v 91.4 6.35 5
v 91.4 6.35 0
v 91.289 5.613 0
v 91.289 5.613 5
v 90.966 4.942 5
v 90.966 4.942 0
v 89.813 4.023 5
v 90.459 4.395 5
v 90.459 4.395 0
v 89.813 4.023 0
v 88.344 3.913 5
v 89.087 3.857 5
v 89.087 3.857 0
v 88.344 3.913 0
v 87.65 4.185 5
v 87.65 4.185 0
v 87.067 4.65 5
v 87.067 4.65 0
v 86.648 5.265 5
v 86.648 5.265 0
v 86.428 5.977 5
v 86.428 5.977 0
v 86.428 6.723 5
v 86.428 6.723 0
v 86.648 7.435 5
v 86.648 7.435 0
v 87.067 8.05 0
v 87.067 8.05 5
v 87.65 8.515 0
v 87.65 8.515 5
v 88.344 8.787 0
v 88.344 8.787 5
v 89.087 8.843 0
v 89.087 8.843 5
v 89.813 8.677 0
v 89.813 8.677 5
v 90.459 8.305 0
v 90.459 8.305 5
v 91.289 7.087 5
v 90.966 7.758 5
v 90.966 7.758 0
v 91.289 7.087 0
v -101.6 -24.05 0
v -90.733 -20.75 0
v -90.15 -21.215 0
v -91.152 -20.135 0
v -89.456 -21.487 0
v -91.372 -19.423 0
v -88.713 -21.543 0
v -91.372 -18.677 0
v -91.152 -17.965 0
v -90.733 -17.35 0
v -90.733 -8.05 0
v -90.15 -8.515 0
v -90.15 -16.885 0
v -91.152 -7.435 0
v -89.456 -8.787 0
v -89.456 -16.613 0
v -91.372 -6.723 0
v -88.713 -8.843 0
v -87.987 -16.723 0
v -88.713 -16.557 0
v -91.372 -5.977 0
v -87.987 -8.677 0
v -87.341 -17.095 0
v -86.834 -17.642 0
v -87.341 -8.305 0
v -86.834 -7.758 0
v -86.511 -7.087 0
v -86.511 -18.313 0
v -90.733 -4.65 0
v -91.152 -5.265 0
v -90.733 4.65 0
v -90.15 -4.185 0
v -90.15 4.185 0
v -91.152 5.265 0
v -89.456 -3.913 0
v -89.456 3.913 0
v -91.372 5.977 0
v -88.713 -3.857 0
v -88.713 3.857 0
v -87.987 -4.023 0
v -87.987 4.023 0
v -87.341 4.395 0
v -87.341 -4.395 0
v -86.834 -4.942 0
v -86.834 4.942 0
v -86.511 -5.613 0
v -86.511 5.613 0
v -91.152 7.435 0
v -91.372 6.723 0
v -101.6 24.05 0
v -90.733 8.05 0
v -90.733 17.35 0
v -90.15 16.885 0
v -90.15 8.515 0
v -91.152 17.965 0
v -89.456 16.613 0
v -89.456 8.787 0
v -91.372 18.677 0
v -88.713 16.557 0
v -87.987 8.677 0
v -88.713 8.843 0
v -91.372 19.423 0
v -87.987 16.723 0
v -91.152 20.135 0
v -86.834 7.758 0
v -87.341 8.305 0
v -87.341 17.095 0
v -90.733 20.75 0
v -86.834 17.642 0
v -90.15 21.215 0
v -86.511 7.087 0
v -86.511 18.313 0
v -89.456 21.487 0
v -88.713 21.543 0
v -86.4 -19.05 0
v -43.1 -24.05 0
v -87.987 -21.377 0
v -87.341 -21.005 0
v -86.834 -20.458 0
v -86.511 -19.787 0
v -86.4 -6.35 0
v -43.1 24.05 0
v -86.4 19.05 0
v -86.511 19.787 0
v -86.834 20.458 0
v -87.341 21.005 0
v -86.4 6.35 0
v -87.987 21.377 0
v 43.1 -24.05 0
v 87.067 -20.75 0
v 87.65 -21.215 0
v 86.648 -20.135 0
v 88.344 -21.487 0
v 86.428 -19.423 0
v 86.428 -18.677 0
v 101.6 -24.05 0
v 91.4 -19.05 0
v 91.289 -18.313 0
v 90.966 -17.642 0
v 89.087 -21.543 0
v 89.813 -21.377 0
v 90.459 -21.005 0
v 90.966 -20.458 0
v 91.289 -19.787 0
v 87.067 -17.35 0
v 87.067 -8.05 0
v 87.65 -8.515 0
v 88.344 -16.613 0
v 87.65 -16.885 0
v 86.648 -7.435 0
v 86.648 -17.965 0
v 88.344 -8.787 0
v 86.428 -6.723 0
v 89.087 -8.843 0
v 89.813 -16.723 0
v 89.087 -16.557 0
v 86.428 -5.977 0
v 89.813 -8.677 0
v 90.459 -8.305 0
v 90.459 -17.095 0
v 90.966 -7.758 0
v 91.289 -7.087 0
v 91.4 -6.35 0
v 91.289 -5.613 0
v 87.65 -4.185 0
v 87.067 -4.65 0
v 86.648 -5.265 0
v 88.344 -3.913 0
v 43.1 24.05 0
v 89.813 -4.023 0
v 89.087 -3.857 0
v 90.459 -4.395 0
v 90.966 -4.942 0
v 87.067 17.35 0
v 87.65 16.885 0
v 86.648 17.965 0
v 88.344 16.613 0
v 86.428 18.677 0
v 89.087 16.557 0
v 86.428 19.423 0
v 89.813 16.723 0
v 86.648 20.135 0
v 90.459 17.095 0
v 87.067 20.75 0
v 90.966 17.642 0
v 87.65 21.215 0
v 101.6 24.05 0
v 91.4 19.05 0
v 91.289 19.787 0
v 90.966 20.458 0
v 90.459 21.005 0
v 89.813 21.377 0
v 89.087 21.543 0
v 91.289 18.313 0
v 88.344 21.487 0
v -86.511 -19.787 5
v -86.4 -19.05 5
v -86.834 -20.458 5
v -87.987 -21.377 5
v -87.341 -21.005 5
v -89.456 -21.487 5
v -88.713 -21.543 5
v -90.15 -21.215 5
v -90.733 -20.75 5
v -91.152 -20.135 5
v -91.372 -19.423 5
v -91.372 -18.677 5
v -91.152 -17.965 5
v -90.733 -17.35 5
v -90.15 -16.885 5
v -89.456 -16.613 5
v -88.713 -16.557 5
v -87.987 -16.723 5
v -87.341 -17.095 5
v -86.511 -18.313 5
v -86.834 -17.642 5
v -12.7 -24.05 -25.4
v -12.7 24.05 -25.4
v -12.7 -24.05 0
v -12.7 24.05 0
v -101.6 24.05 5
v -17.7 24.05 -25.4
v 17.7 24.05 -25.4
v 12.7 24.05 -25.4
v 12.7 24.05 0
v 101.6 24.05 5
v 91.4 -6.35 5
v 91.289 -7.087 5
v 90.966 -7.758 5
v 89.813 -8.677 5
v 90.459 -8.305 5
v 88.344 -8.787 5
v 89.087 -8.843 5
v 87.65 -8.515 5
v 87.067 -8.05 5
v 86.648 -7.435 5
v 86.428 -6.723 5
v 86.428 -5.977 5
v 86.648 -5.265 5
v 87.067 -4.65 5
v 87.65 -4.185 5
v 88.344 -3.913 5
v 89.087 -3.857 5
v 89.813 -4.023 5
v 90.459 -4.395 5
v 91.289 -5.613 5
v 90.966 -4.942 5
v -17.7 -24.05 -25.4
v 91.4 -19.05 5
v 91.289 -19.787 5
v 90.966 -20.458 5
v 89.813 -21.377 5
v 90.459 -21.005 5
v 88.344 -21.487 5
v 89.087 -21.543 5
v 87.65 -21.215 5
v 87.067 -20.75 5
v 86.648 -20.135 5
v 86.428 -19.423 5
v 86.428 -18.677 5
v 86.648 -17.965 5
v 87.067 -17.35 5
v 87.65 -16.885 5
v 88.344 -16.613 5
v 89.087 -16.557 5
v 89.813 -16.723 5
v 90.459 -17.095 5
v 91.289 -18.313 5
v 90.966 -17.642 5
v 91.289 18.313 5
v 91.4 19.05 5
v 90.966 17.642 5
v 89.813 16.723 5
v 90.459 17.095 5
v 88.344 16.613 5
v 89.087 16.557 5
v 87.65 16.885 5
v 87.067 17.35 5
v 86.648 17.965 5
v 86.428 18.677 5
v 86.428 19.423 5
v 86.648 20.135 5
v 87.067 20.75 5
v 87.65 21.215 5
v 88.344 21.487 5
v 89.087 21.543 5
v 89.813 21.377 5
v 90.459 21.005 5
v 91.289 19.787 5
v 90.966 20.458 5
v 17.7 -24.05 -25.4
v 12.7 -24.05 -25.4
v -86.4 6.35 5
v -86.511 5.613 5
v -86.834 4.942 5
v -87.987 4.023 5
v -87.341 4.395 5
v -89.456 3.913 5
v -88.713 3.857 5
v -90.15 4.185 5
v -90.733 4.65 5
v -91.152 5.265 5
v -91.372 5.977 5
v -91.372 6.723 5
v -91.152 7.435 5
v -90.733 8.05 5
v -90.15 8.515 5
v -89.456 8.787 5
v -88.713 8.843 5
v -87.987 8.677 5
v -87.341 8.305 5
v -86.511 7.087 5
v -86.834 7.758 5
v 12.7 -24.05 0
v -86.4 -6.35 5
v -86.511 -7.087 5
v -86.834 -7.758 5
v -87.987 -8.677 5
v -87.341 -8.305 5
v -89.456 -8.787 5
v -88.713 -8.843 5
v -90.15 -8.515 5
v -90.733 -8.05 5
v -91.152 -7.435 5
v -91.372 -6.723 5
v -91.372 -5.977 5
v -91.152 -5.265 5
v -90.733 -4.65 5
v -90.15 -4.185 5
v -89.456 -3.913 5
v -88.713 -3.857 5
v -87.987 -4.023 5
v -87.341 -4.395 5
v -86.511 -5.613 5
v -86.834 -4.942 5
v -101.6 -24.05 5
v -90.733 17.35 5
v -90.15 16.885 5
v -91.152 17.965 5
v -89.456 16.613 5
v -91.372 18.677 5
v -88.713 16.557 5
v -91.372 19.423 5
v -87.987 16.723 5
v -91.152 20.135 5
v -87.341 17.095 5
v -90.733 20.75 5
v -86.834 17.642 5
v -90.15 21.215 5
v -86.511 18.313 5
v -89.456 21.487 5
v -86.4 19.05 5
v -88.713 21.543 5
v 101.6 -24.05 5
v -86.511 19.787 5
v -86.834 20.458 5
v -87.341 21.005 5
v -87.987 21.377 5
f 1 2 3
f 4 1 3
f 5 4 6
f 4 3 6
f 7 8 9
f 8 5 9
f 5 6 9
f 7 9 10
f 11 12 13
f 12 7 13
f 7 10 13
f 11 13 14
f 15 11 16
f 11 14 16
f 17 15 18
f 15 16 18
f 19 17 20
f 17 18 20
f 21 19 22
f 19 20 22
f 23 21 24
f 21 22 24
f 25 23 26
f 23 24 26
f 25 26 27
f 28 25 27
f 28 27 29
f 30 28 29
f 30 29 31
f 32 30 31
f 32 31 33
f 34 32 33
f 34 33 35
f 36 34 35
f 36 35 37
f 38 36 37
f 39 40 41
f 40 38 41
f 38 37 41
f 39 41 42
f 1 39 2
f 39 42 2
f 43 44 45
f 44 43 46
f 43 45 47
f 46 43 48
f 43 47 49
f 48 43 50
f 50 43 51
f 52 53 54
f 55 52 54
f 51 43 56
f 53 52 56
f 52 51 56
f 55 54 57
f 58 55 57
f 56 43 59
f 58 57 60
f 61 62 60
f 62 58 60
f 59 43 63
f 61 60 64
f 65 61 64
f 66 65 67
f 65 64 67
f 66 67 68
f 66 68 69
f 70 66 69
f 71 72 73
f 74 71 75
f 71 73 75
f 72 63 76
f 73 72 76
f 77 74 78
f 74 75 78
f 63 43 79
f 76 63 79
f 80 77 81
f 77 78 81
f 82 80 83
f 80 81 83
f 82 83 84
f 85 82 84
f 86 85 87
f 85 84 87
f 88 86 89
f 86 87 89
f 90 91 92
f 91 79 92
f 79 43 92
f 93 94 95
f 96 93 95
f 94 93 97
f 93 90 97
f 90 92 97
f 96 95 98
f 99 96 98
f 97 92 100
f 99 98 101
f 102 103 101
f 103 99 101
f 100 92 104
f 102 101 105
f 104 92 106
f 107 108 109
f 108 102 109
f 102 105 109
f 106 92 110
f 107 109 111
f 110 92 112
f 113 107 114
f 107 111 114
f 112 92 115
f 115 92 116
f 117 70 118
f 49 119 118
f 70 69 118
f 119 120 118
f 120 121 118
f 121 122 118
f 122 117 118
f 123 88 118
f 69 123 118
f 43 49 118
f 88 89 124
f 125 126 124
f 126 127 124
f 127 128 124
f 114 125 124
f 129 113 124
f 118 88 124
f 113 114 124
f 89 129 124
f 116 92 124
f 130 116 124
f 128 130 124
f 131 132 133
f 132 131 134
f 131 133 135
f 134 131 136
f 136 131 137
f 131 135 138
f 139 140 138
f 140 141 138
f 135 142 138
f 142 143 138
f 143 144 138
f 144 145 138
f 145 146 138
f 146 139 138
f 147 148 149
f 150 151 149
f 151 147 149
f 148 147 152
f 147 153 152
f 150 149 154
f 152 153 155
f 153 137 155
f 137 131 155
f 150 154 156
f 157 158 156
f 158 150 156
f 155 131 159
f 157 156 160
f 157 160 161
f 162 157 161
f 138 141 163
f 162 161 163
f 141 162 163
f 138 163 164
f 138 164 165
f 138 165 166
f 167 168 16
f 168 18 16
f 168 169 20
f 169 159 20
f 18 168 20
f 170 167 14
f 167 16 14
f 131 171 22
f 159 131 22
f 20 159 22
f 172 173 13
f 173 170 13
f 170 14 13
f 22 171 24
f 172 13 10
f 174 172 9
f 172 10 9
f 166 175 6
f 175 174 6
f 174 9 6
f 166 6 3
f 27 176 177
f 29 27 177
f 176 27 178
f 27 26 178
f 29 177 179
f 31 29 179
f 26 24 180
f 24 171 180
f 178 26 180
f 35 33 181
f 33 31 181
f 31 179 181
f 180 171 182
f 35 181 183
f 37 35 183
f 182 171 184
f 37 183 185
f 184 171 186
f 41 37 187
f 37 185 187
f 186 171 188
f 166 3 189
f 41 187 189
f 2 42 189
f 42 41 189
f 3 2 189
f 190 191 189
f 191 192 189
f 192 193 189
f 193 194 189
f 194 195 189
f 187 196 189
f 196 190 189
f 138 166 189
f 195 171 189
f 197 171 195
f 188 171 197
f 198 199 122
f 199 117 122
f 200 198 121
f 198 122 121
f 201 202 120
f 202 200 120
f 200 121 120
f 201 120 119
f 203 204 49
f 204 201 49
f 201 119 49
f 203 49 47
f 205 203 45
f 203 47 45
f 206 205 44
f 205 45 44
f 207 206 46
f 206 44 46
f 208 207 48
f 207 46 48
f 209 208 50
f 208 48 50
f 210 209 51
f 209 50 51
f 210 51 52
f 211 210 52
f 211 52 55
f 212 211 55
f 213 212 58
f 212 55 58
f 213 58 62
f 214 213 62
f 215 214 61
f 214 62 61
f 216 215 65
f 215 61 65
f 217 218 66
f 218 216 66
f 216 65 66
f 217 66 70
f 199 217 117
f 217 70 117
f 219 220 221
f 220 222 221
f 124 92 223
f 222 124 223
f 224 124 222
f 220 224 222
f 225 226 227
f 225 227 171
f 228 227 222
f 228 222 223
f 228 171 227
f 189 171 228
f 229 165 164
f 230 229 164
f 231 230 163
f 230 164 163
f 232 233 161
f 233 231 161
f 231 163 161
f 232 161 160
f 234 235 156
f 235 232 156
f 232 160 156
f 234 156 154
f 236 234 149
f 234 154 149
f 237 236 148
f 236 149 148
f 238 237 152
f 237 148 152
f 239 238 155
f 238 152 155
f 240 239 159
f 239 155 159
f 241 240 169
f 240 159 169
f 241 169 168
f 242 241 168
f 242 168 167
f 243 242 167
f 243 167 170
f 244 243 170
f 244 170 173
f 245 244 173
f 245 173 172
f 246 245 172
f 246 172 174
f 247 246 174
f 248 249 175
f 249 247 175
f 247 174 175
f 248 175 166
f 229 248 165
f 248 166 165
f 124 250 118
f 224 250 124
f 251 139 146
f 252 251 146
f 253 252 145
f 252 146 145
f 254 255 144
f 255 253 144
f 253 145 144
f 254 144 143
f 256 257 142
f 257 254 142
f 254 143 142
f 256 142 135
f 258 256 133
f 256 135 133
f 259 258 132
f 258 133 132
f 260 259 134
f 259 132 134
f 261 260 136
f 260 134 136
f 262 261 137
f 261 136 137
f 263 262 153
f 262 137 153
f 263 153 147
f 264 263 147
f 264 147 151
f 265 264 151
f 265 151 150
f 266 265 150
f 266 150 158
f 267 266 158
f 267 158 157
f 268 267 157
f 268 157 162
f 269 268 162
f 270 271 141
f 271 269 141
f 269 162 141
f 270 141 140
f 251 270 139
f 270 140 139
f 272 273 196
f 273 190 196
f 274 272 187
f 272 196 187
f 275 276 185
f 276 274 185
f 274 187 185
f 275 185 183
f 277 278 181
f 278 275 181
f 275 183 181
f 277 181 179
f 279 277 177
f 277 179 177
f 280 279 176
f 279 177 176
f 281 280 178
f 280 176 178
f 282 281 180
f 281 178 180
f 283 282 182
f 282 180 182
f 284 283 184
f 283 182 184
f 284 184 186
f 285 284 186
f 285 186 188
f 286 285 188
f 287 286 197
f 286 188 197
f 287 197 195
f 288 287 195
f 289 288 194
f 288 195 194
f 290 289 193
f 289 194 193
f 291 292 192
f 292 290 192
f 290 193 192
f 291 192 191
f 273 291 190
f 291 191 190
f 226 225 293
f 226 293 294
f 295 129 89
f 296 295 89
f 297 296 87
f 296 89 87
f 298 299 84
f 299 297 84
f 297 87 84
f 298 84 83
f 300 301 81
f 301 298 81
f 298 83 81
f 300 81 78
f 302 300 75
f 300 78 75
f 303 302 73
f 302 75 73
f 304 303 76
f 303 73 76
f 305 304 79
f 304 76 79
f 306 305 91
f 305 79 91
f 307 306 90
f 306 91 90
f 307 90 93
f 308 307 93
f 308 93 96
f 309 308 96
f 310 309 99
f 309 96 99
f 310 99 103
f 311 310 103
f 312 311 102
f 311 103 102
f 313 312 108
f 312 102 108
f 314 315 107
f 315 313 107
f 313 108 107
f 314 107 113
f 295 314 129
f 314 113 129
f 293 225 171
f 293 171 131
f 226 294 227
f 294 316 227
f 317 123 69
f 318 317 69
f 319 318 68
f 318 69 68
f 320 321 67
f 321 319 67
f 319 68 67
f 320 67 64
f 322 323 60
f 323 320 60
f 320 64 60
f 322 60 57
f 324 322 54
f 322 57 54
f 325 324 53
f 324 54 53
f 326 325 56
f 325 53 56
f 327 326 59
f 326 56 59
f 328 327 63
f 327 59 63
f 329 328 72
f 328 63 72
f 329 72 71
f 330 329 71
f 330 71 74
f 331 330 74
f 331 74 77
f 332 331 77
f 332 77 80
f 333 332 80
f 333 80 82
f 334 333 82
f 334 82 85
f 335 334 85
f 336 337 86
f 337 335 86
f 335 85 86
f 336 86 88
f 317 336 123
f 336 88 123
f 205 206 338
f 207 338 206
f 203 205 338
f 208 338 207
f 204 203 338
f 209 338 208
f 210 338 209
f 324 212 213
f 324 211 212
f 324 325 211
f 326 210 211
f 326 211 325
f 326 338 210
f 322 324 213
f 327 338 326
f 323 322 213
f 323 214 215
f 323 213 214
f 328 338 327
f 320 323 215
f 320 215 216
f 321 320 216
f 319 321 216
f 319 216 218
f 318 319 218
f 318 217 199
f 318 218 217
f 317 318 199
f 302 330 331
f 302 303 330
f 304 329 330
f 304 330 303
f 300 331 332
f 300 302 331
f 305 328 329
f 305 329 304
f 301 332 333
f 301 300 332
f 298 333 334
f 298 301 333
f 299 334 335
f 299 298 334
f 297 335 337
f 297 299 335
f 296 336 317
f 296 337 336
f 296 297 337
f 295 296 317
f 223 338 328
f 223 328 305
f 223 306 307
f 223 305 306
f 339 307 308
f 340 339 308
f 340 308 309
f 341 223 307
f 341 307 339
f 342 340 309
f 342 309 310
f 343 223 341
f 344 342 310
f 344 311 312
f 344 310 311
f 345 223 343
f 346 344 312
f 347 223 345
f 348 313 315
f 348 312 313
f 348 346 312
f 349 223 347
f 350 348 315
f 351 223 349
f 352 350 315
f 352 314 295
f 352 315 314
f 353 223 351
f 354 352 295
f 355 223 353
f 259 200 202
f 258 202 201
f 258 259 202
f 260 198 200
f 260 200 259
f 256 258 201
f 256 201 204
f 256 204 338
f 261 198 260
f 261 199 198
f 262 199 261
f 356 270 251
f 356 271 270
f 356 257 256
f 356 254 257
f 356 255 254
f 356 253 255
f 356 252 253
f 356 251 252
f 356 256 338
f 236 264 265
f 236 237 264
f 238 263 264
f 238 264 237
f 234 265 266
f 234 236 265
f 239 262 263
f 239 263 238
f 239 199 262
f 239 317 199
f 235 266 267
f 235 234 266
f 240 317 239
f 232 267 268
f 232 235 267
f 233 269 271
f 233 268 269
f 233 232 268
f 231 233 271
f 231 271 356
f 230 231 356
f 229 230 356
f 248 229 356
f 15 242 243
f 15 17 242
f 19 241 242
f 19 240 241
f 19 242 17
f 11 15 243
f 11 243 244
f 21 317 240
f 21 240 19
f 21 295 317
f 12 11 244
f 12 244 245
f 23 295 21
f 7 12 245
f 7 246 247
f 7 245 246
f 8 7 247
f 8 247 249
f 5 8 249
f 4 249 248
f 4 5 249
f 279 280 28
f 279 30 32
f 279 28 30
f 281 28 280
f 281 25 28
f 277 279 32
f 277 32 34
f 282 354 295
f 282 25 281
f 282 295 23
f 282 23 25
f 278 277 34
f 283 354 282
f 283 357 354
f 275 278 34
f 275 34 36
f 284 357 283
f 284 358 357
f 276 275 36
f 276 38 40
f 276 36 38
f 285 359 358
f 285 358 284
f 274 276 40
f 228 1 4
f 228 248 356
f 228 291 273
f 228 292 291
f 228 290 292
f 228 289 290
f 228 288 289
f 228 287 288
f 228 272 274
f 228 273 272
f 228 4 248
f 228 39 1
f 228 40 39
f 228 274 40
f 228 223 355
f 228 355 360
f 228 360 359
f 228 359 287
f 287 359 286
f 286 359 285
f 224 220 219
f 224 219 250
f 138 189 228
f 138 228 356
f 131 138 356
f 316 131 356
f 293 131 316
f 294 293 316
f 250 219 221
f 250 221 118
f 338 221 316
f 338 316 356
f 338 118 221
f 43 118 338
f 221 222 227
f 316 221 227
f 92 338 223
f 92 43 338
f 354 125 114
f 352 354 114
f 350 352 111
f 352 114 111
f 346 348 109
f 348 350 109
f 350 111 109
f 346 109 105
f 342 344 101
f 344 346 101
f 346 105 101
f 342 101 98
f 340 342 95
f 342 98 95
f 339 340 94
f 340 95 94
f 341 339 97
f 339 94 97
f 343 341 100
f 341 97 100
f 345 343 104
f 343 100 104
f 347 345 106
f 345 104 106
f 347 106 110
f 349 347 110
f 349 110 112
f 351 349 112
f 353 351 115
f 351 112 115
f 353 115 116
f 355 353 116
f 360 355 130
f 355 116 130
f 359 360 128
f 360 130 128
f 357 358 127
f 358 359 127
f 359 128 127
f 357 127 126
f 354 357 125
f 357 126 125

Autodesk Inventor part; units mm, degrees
ref_plane "YZ Plane" through (0, 0, 0) normal (1, 0, 0) x (0, 1, 0)
ref_plane "XZ Plane" through (0, 0, 0) normal (0, 1, 0) x (-1, 0, 0)
ref_plane "XY Plane" through (0, 0, 0) normal (0, 0, 1) x (1, 0, 0)
sketch "Esboço1" plane through (0, 0, 0) normal (0, 0, 1) x (1, 0, 0)
  line L0 (101.6, -24.05) -> (-101.6, -24.05)
  line L1 (-101.6, -24.05) -> (-101.6, 24.05)
  line L2 (-101.6, 24.05) -> (101.6, 24.05)
  line L3 (101.6, 24.05) -> (101.6, -24.05)
  line L4 (101.6, -24.05) -> (-101.6, 24.05) construction
  line L5 (-101.6, -24.05) -> (101.6, 24.05) construction
  circle A0 centre (-88.9, 6.35) radius 2.5
  circle A1 centre (-88.9, -6.35) radius 2.5
  circle A2 centre (-88.9, 19.05) radius 2.5
  circle A3 centre (-88.9, -19.05) radius 2.5
  line L6 (0, 0) -> (0, 24.05)
  line L7 (-101.6, -24.05) -> (101.6, 24.05) construction
  line L8 (101.6, -24.05) -> (-101.6, 24.05) construction
  circle A4 centre (88.9, 6.35) radius 2.5
  circle A5 centre (88.9, -6.35) radius 2.5
  circle A6 centre (88.9, 19.05) radius 2.5
  circle A7 centre (88.9, -19.05) radius 2.5
  dimension "d0" = 203.2
  dimension "d1" = 5
  dimension "d2" = 12.7
  dimension "d3" = 12.7
  dimension "d4" = 12.7
  dimension "d5" = 12.7
  dimension "d6" = 5
  dimension "d7" = 5
extrude "Extrusão1" add sketch "Esboço1" along normal blind 5
sketch "Esboço2" plane through (0, 0, 0) normal (0, 0, -1) x (-1, 0, 0)
  line L0 (-101.6, 24.05) -> (101.6, 24.05) projected
  line L1 (12.7, -24.05) -> (-12.7, -24.05)
  line L2 (-12.7, -24.05) -> (-12.7, 24.05)
  line L3 (-12.7, 24.05) -> (12.7, 24.05)
  line L4 (12.7, 24.05) -> (12.7, -24.05)
  line L5 (12.7, -24.05) -> (-12.7, 24.05) construction
  line L6 (-12.7, -24.05) -> (12.7, 24.05) construction
  line L7 (17.7, -24.05) -> (-17.7, -24.05)
  line L8 (-17.7, -24.05) -> (-17.7, 24.05)
  line L9 (-17.7, 24.05) -> (17.7, 24.05)
  line L10 (17.7, 24.05) -> (17.7, -24.05)
  line L11 (17.7, -24.05) -> (-17.7, 24.05) construction
  line L12 (-17.7, -24.05) -> (17.7, 24.05) construction
  point P0 (0, 0)
  dimension "d10" = 25.4
  dimension "d11" = 5
extrude "Extrusão2" add sketch "Esboço2" along normal blind 25.4 contours L0 L2 L7 L8 | L0 L10 L7 L4
chamfer "Chanfro1" distance 25.4 angle 45 2 edges at (17.7, 0, 0) (-17.7, 0, 0)
equation "\"d3\" = d2"
equation "\"d4\" = d2"
equation "\"d7\" = d6"
properties part number "Chapa Guia - Elevador"
